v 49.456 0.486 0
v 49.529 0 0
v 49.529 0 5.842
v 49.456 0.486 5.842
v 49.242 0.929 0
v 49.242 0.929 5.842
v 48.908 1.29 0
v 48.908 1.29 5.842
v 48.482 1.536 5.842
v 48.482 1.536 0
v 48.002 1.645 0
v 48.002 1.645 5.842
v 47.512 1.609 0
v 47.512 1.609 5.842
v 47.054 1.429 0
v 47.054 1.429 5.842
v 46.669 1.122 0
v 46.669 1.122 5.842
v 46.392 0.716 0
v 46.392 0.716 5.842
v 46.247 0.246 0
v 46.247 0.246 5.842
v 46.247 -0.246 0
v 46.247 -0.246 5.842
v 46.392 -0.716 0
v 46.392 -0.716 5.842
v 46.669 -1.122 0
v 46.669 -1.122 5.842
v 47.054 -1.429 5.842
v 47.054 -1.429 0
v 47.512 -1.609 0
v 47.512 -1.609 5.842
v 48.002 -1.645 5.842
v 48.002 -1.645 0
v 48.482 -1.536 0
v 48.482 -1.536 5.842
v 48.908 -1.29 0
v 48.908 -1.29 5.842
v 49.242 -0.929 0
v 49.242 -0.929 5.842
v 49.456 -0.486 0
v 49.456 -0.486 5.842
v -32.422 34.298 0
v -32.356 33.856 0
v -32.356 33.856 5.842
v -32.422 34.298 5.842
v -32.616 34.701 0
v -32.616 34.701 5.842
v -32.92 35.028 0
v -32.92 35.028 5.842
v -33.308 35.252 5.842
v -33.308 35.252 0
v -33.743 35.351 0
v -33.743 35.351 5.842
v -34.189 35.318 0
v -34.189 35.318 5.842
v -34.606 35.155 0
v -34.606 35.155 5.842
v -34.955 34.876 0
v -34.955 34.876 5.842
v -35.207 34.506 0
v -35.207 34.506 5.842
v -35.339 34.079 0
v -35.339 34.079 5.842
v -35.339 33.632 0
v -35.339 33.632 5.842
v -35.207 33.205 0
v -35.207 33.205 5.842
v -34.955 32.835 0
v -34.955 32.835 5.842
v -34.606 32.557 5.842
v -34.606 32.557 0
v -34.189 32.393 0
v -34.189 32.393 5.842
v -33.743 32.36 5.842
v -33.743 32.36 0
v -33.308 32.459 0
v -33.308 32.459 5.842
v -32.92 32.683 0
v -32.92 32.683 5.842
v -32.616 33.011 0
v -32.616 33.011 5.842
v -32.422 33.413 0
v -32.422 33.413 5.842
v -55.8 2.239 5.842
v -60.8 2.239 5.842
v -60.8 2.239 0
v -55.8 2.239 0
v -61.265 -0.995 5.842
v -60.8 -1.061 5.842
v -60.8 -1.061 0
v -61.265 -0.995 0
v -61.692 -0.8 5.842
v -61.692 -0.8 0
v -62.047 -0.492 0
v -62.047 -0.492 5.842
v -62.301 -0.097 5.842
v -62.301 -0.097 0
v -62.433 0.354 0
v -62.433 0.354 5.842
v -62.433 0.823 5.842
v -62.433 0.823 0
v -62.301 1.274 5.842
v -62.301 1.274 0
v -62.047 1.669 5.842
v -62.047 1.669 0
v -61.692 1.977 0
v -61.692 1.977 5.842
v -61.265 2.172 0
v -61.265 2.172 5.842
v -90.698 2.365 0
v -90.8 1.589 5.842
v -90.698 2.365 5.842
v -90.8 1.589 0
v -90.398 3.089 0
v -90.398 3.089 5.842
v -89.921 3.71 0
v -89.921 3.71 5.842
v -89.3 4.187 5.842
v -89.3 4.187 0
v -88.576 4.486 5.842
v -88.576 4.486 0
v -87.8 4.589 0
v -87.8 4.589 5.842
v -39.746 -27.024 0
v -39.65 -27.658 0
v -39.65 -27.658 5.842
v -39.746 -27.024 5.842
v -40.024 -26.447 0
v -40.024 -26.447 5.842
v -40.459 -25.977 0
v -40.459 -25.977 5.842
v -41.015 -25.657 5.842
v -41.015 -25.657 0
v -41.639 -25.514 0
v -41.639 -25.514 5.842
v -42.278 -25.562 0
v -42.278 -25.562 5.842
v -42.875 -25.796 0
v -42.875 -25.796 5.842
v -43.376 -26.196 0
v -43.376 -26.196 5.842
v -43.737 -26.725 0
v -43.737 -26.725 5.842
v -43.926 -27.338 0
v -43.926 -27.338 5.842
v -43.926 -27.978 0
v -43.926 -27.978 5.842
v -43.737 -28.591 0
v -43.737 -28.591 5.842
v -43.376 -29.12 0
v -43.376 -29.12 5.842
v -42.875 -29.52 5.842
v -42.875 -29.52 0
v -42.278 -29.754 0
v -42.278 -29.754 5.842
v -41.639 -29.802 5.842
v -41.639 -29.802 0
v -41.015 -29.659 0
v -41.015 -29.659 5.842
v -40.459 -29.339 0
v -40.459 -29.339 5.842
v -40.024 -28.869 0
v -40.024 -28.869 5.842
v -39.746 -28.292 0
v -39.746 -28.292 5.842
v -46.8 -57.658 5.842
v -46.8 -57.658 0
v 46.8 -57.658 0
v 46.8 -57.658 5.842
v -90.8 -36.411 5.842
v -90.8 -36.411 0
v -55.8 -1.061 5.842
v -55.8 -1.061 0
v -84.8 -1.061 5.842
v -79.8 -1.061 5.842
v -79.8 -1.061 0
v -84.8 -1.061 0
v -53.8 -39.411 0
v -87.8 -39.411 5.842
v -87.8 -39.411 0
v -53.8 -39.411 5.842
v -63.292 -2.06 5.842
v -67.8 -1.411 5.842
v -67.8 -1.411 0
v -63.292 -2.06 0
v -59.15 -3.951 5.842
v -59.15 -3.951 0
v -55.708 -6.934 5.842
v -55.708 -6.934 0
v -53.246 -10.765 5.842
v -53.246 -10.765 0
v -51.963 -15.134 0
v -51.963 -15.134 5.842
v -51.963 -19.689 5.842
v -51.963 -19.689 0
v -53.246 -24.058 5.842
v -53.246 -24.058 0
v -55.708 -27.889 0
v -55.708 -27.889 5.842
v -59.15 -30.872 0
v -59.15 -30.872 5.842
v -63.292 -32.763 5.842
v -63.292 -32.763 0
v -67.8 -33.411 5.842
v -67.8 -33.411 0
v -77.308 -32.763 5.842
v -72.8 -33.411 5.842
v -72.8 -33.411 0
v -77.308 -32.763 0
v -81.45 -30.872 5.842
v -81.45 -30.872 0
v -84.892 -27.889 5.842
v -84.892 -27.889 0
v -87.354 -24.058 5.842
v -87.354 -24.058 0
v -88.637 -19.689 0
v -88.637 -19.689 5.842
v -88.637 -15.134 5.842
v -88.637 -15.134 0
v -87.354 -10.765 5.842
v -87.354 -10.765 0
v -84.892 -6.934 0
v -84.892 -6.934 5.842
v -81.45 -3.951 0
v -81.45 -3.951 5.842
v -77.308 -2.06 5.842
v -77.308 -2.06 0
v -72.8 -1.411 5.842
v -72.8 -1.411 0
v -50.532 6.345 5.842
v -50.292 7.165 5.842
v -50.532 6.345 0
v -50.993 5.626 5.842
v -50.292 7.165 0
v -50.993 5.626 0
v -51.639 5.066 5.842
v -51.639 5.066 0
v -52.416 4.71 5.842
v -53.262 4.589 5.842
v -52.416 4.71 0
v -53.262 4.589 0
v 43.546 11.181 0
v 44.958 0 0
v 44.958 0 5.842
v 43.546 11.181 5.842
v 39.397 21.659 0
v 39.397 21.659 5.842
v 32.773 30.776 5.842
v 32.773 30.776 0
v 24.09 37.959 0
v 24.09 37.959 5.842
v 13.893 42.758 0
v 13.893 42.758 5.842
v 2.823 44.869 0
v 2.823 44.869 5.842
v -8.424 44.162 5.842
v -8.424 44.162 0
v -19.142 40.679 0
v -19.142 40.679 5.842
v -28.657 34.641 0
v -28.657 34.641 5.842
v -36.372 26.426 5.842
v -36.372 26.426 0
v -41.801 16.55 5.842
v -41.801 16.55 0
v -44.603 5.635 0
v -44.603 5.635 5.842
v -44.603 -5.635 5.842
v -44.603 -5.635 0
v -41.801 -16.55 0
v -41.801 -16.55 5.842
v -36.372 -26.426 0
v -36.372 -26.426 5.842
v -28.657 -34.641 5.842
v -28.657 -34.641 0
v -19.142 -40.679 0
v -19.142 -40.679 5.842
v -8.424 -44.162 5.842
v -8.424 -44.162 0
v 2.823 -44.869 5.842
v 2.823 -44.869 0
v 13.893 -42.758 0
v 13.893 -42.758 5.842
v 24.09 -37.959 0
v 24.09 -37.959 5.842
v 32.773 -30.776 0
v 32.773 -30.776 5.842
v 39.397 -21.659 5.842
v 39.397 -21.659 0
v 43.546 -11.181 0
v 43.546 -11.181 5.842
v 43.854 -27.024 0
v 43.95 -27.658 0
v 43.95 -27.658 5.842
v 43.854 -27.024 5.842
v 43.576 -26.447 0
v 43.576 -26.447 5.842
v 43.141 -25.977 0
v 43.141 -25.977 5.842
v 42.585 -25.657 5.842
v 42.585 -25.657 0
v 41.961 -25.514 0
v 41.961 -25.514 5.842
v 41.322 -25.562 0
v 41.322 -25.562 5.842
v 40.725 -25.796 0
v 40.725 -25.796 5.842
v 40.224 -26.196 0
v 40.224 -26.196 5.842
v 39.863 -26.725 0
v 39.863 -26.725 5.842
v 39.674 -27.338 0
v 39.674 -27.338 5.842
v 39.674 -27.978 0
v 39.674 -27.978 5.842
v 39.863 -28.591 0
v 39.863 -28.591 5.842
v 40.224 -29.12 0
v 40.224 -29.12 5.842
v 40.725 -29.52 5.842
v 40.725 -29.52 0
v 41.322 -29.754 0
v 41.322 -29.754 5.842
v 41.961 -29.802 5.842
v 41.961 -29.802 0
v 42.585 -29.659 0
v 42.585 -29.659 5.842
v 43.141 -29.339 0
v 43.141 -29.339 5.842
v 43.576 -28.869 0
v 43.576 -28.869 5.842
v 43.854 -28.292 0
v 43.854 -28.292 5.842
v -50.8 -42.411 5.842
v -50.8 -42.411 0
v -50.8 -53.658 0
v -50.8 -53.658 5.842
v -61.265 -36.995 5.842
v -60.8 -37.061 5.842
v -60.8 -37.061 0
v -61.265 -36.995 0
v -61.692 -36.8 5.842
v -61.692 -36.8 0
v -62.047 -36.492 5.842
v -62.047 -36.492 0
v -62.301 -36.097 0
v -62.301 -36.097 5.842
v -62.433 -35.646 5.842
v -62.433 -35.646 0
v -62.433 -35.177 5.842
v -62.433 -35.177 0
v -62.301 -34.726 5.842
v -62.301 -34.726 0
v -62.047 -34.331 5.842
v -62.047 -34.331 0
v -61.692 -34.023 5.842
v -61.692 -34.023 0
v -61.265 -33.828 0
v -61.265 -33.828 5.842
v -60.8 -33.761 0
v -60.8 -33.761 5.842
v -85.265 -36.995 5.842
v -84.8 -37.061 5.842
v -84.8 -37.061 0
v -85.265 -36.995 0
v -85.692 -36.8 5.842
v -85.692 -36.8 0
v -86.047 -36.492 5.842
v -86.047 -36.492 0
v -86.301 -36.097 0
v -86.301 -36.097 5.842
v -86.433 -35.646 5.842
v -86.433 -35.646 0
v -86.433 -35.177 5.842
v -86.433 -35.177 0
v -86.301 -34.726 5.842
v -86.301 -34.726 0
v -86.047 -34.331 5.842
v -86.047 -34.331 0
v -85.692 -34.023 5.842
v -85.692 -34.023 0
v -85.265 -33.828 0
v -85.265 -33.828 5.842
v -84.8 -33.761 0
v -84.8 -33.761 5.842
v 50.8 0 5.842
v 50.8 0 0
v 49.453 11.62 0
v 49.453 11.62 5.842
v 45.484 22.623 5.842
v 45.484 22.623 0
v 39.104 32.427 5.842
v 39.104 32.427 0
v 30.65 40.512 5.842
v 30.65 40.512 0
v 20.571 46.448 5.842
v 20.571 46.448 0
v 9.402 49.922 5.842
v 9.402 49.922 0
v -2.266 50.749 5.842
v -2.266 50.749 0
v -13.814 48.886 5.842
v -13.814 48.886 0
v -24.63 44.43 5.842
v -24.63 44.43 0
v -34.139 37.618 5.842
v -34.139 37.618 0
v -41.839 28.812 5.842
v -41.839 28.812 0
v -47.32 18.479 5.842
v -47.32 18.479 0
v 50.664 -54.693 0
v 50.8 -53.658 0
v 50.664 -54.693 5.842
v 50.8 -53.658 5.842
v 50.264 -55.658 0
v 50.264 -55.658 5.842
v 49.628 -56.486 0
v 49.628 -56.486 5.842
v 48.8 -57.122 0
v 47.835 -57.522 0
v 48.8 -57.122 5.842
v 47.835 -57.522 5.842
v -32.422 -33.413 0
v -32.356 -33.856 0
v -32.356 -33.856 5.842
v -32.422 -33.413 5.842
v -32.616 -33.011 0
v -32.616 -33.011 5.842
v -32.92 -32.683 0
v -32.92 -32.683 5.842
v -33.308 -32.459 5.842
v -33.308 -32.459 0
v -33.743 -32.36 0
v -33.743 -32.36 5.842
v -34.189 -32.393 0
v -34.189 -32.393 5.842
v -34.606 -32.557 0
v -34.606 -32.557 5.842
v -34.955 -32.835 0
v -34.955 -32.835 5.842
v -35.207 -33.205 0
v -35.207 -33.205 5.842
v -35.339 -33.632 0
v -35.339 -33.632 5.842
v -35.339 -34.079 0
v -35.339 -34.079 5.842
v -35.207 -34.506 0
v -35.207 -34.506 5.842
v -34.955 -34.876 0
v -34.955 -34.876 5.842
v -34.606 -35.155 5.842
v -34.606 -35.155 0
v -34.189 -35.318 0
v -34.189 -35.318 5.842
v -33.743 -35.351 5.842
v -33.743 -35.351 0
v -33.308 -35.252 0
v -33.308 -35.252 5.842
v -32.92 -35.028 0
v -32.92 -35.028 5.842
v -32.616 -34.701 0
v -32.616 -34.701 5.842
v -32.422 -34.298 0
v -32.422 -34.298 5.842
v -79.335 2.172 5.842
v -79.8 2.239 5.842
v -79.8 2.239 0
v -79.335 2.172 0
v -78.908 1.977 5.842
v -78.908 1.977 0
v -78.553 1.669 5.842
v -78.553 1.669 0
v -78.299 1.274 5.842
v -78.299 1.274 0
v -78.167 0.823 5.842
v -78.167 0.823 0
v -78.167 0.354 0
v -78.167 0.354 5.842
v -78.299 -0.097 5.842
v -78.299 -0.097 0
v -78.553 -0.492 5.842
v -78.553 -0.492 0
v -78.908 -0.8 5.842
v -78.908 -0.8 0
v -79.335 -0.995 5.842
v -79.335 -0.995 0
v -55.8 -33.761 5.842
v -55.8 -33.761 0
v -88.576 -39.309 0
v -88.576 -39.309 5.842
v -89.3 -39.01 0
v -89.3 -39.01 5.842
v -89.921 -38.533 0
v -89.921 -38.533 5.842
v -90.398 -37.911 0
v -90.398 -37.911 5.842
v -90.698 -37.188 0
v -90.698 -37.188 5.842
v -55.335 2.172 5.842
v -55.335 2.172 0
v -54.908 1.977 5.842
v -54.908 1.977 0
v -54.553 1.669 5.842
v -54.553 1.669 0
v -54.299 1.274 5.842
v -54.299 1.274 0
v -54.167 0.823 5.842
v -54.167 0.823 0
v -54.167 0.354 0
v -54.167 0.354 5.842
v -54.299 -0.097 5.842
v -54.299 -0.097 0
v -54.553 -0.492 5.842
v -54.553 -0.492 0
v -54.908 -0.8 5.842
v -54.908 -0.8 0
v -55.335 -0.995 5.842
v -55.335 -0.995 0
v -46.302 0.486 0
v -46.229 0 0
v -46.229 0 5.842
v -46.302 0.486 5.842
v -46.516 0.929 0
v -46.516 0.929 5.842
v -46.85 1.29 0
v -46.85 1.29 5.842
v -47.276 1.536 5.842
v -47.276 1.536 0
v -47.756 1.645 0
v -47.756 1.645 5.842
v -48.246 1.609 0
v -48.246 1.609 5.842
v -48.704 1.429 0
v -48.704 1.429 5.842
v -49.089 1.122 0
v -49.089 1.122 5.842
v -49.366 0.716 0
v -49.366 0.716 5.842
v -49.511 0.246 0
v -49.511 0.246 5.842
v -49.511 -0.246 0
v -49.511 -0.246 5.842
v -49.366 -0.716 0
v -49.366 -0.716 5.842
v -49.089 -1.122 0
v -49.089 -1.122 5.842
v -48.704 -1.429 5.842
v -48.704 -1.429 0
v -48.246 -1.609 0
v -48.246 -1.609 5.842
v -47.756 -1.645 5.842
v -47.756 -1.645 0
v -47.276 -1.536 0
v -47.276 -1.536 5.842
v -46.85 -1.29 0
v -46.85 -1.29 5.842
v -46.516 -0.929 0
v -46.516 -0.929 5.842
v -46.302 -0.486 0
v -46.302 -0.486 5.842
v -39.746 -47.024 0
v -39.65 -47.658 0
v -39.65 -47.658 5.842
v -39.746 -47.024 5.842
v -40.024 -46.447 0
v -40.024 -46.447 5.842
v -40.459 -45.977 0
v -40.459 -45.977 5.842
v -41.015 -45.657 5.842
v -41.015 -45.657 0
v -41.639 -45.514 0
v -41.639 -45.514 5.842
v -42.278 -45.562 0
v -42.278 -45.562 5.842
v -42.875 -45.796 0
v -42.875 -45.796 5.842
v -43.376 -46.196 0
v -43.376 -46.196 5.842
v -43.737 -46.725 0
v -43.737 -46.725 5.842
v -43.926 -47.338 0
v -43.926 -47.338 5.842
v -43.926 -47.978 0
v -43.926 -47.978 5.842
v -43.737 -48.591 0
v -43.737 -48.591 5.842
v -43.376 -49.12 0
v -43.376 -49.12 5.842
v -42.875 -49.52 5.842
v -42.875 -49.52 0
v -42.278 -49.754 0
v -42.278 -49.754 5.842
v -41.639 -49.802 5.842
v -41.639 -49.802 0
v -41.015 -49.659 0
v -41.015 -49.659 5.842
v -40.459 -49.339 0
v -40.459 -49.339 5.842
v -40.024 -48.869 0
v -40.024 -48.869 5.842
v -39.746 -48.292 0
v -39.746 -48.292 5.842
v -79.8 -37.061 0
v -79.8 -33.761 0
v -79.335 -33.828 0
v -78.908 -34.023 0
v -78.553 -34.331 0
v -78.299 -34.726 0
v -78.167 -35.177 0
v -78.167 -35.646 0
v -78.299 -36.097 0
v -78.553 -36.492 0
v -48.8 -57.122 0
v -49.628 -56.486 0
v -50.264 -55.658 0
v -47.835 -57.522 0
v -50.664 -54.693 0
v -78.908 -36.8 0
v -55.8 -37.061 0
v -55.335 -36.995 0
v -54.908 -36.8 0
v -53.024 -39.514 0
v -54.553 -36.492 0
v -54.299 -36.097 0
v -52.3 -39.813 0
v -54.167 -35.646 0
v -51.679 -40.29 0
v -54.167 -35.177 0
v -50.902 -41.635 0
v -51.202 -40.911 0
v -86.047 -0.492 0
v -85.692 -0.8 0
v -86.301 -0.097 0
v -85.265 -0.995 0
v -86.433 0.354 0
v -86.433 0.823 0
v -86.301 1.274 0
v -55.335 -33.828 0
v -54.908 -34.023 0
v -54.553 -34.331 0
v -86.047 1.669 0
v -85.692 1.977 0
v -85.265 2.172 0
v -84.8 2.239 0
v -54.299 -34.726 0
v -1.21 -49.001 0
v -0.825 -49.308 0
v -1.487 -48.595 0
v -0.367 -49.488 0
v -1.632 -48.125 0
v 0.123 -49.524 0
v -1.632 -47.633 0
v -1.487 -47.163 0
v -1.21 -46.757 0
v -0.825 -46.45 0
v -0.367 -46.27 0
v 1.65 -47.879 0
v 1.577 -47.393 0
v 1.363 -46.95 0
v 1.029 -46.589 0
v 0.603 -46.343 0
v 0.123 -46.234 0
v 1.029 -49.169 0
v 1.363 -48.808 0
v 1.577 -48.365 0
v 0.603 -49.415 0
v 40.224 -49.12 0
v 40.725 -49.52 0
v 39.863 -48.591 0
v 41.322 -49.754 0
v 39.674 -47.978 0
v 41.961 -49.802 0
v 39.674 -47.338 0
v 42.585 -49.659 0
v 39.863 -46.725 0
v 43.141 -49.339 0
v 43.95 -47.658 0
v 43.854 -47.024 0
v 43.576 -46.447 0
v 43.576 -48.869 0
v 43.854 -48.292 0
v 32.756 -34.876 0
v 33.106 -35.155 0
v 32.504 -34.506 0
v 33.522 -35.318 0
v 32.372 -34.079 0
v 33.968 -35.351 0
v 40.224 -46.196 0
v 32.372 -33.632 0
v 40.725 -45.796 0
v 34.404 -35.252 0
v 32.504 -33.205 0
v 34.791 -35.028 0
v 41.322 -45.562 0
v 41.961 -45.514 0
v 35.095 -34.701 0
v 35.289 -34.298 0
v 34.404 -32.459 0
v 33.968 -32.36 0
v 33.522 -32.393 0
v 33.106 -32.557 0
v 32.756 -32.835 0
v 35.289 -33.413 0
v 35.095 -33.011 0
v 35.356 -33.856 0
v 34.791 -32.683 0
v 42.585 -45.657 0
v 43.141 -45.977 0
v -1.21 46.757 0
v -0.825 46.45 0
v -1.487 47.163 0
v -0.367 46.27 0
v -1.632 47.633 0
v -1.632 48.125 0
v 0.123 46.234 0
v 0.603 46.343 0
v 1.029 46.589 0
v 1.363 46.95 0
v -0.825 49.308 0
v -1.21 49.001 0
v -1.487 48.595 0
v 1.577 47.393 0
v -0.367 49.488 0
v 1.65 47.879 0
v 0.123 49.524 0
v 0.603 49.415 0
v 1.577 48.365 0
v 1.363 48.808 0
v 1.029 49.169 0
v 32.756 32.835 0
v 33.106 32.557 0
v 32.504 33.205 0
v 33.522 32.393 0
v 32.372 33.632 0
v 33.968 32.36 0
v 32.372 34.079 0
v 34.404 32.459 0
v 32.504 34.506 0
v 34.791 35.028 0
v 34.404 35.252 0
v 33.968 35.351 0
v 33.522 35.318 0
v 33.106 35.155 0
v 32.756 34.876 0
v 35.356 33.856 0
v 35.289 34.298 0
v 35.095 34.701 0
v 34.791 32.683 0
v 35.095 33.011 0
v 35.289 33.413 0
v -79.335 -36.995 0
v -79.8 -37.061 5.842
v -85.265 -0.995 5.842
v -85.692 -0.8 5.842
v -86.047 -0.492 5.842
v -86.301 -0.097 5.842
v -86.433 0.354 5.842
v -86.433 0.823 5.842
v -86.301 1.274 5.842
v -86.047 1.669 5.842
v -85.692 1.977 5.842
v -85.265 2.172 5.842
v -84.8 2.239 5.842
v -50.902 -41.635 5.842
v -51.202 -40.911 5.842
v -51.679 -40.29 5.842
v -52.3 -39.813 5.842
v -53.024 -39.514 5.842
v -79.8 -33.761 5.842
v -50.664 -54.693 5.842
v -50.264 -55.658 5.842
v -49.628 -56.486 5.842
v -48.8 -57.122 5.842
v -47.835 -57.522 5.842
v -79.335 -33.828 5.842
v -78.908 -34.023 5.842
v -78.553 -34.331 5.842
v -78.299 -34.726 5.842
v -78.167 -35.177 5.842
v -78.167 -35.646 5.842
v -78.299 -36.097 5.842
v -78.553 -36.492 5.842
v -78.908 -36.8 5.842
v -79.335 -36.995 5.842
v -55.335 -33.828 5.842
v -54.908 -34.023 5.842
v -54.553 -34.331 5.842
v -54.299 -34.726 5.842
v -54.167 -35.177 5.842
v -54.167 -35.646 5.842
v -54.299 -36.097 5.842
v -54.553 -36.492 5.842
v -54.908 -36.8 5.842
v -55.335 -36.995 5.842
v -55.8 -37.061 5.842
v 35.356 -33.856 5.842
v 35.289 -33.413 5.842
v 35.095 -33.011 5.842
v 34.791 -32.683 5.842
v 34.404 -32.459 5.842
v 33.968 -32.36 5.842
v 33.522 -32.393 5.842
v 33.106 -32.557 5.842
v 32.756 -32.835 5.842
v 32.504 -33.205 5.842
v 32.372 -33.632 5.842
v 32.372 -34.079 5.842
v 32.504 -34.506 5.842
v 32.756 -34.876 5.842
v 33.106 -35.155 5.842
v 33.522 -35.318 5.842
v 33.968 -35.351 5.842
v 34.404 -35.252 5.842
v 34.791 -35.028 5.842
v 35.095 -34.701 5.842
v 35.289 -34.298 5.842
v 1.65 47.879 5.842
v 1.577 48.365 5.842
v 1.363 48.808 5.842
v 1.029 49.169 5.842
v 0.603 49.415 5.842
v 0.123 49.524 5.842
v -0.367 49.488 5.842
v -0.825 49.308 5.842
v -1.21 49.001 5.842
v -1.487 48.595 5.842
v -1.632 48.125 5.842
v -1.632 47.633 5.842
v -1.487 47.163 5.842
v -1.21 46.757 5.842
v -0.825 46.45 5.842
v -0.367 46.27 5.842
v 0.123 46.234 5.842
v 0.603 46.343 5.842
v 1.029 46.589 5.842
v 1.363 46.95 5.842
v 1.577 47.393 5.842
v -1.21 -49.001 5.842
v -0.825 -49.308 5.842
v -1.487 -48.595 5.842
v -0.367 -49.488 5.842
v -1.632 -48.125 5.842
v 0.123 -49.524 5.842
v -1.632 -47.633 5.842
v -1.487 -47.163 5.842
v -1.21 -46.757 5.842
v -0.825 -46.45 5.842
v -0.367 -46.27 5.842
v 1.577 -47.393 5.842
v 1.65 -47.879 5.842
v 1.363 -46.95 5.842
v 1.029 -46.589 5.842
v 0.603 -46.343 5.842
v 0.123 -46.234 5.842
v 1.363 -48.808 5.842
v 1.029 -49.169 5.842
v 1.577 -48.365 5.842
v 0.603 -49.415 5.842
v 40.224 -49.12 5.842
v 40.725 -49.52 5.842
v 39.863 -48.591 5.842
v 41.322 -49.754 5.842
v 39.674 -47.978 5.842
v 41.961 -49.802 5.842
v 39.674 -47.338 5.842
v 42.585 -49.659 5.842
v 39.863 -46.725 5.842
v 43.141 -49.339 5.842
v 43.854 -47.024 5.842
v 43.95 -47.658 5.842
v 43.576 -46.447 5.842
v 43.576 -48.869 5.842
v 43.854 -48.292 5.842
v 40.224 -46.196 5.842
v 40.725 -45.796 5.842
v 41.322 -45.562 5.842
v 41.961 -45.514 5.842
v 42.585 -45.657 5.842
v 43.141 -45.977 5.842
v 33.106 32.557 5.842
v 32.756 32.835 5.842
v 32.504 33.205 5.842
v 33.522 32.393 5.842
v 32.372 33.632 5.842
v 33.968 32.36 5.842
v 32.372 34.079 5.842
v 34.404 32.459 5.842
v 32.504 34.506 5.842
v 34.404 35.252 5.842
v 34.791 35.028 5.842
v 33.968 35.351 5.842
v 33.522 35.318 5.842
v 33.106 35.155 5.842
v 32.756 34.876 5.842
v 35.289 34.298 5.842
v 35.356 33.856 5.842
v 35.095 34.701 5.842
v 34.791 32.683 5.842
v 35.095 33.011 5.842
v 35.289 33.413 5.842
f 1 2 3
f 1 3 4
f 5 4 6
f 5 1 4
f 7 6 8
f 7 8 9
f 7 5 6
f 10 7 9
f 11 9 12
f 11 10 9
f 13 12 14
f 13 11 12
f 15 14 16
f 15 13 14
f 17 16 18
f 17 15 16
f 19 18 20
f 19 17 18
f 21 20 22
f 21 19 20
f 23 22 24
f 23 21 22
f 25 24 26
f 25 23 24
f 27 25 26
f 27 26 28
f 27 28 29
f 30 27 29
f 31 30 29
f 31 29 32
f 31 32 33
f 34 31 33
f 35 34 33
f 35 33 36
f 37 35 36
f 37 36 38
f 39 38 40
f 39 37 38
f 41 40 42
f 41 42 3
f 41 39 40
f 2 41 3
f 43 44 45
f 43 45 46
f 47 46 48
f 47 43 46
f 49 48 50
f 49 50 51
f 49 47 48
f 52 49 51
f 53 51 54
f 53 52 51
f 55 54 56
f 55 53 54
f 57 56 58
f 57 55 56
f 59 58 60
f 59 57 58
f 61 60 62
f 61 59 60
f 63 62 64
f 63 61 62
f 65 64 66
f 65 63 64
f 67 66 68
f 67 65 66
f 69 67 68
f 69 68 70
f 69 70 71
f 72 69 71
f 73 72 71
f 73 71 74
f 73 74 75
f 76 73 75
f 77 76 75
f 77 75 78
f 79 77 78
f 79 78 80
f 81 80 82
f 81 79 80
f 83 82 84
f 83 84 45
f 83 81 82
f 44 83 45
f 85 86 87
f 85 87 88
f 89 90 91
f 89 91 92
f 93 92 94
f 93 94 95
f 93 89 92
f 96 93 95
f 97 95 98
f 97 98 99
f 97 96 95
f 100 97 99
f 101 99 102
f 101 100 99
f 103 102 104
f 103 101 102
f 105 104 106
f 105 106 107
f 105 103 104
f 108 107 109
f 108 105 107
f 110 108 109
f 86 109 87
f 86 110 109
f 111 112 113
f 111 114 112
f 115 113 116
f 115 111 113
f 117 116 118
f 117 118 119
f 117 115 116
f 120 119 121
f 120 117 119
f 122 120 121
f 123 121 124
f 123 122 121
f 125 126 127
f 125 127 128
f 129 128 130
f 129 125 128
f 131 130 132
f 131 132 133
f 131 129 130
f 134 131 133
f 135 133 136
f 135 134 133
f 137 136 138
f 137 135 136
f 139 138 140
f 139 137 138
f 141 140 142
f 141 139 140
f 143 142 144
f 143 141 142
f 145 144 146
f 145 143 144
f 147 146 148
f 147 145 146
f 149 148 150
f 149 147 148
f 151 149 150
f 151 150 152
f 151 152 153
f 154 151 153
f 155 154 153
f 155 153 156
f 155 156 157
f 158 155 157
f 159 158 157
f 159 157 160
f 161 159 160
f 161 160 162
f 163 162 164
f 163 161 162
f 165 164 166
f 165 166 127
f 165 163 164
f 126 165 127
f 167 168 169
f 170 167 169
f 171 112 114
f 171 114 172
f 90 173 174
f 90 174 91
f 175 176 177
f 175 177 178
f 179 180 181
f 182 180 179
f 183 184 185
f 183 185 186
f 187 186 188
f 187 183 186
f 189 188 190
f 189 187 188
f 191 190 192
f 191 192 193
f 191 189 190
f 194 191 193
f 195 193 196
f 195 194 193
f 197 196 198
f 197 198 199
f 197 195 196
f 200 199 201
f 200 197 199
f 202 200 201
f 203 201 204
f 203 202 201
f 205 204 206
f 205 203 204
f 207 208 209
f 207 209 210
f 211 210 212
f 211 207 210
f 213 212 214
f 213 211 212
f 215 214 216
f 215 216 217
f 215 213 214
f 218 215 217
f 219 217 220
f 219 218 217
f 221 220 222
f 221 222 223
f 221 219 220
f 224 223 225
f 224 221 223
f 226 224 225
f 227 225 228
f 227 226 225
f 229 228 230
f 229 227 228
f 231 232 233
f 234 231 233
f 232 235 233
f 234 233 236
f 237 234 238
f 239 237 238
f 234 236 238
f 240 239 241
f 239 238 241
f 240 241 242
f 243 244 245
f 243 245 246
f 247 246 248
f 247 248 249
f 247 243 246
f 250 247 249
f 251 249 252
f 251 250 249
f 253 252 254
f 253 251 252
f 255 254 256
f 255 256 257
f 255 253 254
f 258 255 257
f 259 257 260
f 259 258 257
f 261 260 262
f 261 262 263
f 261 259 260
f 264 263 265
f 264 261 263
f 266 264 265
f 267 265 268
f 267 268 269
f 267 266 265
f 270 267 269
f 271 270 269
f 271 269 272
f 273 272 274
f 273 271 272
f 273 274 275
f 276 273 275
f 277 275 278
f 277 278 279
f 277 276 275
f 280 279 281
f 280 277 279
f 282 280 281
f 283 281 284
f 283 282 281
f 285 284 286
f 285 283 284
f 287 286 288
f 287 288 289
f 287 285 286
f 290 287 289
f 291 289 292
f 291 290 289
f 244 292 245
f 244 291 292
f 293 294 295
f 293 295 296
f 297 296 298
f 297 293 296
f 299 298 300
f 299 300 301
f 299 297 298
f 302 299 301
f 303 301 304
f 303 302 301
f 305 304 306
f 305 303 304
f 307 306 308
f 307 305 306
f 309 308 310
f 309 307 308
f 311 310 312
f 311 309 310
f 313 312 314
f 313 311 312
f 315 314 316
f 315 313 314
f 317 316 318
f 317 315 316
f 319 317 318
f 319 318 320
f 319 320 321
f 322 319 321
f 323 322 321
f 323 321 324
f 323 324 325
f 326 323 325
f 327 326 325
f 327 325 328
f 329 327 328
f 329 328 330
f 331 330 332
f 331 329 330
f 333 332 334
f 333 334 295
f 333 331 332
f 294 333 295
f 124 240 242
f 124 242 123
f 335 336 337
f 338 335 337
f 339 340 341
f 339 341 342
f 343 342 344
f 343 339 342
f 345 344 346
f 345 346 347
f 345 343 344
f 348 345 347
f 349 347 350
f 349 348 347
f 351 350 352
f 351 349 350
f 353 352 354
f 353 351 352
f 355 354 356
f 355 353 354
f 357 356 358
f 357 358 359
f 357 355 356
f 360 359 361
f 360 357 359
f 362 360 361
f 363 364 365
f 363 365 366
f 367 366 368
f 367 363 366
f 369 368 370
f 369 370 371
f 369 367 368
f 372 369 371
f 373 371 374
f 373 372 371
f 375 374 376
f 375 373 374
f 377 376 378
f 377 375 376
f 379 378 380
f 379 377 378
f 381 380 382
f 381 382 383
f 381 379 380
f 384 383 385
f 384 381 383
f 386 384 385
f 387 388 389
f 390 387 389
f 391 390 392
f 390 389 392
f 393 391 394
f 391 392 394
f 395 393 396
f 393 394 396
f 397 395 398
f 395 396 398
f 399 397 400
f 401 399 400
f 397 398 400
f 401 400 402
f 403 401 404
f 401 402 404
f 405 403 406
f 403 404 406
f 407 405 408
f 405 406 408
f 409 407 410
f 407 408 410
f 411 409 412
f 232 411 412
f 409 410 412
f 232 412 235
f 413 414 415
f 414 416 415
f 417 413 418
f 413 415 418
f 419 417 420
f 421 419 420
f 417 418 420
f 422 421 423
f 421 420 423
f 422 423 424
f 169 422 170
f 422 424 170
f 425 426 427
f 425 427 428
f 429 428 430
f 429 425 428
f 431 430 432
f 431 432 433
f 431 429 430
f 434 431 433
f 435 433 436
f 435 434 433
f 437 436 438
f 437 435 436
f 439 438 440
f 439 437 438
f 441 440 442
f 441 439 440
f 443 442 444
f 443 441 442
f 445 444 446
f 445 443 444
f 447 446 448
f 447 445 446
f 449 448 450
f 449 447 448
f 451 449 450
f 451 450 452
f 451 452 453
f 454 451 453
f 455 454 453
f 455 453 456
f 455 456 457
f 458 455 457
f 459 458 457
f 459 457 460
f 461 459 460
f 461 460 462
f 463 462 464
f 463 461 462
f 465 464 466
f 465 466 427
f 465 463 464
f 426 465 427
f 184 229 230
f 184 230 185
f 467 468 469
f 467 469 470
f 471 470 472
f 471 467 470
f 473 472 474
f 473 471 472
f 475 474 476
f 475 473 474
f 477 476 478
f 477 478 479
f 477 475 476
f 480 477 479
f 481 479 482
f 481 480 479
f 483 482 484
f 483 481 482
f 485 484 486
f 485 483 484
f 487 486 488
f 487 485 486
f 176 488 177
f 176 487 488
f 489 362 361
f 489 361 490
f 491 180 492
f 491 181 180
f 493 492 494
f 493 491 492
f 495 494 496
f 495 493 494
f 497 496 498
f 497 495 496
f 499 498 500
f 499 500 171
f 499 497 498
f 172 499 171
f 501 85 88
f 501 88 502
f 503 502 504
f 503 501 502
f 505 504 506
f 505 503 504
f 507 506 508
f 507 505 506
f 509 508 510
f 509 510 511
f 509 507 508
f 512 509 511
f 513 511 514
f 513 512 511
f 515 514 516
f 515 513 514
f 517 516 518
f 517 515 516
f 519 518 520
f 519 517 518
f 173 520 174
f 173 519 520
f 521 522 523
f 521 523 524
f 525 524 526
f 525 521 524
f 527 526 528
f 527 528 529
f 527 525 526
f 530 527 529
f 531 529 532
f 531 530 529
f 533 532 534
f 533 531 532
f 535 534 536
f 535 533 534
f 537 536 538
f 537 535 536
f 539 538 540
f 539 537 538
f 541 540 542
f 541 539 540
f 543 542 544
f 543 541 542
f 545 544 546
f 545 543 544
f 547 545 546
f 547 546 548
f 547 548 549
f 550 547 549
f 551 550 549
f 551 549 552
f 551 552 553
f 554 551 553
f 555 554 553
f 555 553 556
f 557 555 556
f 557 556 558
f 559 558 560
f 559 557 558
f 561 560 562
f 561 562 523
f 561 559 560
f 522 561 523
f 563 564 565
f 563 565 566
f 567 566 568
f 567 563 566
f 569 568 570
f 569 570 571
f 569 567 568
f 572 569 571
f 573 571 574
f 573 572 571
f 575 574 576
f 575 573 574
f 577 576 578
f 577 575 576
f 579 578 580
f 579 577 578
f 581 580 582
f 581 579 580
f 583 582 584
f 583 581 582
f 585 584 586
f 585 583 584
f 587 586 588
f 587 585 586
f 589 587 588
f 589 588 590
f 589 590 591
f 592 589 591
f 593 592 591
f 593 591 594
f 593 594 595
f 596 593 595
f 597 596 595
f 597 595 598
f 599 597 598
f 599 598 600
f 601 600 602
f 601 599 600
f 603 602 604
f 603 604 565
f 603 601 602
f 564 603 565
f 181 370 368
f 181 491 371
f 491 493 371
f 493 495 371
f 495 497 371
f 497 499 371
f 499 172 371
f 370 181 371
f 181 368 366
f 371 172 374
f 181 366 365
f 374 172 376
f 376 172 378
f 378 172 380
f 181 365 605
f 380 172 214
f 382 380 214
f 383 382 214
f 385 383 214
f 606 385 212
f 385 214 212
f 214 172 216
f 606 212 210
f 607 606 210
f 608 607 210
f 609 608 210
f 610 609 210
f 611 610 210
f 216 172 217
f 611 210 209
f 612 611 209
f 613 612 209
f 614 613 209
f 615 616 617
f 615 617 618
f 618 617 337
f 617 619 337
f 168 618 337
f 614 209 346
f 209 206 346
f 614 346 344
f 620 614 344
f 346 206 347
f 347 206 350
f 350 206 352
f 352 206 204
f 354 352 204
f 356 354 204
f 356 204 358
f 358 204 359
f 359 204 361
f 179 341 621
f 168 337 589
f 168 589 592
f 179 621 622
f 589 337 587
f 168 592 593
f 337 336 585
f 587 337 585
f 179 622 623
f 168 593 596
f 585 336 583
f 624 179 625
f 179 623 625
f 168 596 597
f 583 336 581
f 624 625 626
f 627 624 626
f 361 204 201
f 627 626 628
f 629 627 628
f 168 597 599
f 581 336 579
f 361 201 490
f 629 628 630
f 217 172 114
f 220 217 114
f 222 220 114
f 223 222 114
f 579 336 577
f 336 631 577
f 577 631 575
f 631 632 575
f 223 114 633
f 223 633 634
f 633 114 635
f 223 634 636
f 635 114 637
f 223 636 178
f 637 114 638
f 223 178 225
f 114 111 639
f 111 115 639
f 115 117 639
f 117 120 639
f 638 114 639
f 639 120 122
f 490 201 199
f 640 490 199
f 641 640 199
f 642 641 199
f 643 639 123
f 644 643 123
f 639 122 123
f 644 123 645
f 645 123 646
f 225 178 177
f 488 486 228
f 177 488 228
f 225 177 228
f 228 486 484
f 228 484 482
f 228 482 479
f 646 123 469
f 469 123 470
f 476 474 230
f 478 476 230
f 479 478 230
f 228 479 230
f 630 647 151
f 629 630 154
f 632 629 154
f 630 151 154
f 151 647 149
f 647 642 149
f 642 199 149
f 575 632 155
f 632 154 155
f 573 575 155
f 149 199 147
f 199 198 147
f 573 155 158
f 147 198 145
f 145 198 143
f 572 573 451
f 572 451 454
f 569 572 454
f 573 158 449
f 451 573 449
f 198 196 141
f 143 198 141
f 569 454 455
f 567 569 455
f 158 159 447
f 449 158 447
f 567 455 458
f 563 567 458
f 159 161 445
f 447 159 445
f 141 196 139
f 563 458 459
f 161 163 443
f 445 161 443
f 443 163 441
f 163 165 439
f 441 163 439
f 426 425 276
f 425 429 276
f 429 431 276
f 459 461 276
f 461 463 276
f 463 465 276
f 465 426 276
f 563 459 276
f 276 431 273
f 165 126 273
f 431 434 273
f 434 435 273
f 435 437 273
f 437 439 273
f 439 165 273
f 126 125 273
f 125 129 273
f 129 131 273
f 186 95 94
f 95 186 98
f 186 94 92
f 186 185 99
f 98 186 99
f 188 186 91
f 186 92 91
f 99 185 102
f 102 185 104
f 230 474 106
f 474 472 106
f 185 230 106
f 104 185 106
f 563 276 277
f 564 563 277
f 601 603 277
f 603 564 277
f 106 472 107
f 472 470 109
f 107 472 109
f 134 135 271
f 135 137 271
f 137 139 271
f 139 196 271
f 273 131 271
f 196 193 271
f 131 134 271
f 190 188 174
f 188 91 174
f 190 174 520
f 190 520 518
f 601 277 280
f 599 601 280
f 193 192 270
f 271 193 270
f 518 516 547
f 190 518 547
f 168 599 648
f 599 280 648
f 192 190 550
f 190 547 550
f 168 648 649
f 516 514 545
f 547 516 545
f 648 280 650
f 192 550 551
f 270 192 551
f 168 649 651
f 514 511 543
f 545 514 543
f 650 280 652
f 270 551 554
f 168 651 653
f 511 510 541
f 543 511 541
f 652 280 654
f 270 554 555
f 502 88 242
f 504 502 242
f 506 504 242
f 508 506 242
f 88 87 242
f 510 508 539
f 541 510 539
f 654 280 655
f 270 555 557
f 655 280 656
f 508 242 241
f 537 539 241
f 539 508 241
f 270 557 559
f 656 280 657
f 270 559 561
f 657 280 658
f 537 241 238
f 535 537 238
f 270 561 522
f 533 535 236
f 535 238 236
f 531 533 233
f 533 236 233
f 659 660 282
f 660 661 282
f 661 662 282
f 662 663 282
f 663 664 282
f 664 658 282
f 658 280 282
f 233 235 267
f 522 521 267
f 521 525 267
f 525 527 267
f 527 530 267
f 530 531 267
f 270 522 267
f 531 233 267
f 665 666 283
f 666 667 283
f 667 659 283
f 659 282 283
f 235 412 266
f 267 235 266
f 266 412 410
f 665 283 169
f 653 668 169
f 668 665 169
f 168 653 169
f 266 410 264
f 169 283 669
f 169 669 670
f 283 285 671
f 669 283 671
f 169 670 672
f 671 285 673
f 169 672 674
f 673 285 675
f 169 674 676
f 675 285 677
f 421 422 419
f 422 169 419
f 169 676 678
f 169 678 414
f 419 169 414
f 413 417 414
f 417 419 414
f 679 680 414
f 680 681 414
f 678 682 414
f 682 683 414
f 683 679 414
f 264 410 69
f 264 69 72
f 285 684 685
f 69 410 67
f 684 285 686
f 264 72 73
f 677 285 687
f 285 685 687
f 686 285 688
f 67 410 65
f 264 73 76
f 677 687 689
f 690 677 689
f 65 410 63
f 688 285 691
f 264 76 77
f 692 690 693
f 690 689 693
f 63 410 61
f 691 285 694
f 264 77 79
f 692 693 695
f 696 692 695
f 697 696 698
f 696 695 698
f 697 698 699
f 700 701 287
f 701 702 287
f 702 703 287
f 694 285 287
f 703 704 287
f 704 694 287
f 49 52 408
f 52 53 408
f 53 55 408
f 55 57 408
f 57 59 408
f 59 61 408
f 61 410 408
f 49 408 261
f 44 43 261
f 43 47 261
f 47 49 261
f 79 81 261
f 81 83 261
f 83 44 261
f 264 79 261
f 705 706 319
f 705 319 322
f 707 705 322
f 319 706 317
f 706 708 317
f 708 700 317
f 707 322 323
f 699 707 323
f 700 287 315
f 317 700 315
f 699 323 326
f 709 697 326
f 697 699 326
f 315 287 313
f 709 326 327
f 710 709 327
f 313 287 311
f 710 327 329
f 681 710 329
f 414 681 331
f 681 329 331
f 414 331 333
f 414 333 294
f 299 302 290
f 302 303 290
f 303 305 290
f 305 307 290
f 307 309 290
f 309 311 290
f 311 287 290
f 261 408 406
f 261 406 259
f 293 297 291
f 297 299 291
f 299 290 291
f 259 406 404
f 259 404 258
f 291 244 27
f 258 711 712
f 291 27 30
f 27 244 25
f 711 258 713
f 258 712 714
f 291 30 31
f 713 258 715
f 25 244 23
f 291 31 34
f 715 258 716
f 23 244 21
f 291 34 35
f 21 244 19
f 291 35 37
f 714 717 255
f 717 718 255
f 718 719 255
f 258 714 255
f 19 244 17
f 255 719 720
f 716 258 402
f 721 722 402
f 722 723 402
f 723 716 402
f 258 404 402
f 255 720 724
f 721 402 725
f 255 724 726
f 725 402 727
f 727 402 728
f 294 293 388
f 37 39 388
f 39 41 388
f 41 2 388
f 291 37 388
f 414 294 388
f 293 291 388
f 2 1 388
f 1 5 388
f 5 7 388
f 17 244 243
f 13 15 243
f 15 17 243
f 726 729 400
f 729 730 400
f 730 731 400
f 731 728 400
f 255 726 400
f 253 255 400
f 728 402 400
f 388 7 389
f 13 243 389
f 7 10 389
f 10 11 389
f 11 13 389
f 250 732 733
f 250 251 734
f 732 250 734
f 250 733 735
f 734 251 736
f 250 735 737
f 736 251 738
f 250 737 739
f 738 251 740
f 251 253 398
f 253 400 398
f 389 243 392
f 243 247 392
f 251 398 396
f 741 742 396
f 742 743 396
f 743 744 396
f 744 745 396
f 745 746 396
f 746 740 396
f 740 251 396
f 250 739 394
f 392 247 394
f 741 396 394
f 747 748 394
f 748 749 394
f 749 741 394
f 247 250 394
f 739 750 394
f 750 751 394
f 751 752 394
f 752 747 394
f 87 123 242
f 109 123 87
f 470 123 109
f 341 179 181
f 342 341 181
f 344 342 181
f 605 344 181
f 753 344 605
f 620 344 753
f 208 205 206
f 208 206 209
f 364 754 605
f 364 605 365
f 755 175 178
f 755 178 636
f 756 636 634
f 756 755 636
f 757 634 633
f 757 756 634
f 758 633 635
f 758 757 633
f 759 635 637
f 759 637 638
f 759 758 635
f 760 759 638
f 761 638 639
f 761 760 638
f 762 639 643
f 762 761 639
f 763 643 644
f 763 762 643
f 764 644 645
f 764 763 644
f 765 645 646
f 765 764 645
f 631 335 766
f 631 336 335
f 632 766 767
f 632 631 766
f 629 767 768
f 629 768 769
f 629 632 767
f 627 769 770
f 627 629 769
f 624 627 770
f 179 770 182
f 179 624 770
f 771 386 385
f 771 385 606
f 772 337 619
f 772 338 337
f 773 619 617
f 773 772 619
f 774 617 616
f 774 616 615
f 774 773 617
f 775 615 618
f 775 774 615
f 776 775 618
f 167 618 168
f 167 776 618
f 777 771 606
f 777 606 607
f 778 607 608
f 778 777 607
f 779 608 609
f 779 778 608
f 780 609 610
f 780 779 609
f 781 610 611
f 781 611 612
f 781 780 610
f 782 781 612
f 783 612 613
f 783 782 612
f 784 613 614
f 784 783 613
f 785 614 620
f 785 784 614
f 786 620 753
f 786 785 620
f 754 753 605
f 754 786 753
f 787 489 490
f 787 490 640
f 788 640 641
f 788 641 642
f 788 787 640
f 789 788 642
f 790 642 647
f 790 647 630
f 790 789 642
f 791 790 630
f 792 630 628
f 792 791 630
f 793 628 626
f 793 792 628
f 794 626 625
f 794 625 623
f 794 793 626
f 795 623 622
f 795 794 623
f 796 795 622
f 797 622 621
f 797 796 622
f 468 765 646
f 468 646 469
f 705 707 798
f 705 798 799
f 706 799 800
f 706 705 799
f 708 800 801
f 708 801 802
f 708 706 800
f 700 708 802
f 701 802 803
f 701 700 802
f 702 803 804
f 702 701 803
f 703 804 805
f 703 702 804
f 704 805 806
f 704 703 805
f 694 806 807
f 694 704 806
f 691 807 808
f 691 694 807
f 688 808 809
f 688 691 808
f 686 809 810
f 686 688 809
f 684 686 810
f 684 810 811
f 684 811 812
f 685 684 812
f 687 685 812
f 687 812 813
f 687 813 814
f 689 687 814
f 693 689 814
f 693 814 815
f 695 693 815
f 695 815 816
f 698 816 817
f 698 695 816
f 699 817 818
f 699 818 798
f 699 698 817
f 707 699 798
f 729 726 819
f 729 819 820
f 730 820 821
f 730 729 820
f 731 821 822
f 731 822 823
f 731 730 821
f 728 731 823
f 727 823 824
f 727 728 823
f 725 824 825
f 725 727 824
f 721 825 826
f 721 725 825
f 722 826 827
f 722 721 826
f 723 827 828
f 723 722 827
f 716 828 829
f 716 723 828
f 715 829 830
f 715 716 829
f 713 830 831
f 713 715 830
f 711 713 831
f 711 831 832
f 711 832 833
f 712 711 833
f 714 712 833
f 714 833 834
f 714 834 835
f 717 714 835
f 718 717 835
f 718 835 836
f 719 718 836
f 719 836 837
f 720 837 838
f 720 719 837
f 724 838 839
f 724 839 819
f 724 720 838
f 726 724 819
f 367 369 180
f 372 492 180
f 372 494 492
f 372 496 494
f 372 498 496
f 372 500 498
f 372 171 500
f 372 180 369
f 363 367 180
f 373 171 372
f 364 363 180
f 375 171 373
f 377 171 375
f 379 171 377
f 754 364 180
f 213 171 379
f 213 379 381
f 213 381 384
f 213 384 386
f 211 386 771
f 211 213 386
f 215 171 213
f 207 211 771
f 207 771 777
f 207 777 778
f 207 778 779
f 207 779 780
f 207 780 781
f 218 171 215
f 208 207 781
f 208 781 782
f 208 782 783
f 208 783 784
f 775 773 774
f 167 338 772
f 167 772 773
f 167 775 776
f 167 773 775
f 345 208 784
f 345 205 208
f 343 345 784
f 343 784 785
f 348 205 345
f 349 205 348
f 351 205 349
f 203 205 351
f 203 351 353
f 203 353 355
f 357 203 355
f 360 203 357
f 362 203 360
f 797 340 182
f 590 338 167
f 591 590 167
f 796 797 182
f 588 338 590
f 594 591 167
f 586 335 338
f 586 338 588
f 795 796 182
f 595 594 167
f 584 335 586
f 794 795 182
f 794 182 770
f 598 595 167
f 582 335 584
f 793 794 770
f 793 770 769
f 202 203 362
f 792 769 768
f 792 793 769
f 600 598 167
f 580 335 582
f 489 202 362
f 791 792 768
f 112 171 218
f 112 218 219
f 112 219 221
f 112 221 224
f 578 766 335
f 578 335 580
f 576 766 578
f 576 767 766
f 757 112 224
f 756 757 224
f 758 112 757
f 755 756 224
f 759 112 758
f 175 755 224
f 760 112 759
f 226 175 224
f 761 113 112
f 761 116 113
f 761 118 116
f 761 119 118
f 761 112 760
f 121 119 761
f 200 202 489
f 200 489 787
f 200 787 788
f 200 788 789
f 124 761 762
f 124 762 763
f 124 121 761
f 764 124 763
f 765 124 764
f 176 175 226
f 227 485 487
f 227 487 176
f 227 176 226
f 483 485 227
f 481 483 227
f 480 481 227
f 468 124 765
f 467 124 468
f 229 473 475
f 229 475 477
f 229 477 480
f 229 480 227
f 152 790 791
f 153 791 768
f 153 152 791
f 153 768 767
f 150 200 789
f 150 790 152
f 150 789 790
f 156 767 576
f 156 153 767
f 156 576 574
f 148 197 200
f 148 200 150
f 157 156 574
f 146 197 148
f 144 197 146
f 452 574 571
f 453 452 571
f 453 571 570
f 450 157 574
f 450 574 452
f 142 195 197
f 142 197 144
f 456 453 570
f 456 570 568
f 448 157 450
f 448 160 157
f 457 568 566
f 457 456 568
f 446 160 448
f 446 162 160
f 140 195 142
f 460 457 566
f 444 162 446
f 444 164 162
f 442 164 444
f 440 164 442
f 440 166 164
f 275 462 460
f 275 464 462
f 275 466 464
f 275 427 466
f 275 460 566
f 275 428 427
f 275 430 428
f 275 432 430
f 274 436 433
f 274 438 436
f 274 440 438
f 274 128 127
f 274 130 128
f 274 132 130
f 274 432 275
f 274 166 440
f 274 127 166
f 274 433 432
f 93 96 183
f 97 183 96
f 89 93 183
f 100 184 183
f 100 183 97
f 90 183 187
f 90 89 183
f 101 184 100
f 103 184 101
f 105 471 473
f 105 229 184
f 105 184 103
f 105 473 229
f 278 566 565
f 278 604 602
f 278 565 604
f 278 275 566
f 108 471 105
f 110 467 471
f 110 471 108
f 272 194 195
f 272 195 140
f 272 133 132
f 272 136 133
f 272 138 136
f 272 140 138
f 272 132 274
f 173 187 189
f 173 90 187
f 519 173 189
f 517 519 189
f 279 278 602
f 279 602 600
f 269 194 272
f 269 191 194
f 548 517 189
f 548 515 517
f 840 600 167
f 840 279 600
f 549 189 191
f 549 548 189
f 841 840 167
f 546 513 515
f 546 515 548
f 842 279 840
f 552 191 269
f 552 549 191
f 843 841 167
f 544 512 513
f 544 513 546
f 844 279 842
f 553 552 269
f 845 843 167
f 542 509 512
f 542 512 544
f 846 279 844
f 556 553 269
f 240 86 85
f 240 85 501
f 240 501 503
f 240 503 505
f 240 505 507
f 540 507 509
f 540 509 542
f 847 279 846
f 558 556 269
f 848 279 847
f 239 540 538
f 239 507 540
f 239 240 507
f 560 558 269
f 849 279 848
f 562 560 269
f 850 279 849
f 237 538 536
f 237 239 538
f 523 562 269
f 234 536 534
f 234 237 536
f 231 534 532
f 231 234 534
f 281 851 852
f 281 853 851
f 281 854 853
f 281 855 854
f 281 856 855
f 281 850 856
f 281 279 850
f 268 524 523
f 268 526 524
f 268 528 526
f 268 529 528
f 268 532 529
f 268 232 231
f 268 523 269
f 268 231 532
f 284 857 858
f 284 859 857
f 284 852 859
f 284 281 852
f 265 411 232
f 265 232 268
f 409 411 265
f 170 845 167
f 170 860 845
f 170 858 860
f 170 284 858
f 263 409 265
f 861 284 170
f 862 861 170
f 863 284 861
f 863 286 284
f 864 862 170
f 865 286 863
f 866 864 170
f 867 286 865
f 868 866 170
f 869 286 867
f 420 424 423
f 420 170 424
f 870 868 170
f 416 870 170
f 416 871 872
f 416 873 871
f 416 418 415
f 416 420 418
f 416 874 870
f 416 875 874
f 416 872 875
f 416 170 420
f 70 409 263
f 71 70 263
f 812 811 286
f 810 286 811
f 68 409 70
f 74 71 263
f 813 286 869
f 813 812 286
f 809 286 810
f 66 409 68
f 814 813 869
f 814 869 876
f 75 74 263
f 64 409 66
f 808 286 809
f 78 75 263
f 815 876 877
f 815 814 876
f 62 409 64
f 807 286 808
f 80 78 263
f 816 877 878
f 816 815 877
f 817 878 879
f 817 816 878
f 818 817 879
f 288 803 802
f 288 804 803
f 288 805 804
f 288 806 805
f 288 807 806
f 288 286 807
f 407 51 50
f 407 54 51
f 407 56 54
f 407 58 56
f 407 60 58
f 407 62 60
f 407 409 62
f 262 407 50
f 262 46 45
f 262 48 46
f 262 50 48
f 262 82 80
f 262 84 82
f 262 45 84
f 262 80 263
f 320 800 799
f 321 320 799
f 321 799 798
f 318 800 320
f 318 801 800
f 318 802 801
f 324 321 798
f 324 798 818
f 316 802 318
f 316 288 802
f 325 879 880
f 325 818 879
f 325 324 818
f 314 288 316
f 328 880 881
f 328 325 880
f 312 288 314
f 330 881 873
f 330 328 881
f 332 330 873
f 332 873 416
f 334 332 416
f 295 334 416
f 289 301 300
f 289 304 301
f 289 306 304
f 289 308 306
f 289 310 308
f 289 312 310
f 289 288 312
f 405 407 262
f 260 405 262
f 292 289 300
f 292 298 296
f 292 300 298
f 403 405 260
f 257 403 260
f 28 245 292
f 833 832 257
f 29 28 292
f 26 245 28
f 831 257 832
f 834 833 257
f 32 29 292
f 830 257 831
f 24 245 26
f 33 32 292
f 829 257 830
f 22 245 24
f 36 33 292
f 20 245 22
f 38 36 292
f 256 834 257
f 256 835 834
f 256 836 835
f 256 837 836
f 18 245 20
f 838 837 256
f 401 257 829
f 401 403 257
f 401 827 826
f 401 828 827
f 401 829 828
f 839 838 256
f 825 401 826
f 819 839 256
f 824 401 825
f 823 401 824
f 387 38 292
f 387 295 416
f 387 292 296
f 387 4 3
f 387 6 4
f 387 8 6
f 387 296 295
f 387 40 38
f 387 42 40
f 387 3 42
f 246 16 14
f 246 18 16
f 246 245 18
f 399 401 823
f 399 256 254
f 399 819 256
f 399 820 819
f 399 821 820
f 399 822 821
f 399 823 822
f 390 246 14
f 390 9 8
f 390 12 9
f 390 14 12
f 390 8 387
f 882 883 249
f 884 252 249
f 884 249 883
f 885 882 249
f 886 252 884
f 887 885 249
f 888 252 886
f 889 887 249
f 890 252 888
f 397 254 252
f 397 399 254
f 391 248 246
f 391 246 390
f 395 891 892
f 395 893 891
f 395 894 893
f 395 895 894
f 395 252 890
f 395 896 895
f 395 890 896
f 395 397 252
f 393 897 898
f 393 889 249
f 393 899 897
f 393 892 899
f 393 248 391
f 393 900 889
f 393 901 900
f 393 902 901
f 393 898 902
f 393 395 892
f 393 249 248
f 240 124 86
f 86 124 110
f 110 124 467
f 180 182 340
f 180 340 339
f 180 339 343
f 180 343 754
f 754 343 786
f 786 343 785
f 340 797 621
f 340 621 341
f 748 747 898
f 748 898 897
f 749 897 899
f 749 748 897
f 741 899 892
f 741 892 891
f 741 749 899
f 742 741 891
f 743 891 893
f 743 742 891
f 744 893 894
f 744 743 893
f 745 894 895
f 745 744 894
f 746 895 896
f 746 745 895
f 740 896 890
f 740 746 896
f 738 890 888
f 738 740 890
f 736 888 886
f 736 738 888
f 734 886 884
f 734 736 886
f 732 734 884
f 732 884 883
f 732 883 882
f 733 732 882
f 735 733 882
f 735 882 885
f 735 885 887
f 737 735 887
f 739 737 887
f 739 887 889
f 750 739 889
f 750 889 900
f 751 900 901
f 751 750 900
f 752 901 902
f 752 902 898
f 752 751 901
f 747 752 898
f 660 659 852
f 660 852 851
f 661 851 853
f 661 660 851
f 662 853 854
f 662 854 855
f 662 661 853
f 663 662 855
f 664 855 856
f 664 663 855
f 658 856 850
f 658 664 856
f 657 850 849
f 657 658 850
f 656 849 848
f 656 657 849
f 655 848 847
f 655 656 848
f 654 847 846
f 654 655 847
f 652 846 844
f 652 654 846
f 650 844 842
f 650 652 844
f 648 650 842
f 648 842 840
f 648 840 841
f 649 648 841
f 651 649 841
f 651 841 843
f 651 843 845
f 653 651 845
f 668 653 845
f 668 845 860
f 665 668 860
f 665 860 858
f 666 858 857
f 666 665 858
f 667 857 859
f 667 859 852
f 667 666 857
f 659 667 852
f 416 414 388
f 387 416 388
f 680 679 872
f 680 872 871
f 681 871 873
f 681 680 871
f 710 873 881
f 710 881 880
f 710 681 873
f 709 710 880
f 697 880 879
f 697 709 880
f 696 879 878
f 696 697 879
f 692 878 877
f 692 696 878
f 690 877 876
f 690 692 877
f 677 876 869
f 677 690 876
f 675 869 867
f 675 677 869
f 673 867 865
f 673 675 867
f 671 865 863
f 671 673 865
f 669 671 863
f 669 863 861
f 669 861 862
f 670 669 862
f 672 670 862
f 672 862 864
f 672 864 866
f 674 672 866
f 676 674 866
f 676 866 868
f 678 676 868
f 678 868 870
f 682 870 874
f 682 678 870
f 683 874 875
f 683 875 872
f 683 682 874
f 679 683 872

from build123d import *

# Parameters (mm, degrees)
SKETCH1_R           = 2.15
SKETCH1_R_2         = 1.5
SKETCH1_R_3         = 1.65
SKETCH1_R_4         = 44.958
BOSS_EXTRUDE1_DEPTH = 5.842
FILLET1_R           = 4
BOSS_EXTRUDE2_DEPTH = 5.842
FILLET2_R           = 3


with BuildPart() as part:
    # Sketch1 → Boss-Extrude1 (new body)
    # profile 1 of 2: a face of its own
    with BuildSketch(Plane.XY):
        with BuildLine():
            ThreePointArc((50.8, 0), (0, 50.8), (-50.8, 0))
            Line((-50.8, 0), (-50.8, -57.658))
            Line((-50.8, -57.658), (0, -57.658))
            Line((0, -57.658), (50.8, -57.658))
            Line((50.8, -57.658), (50.8, 0))
        make_face()
        with Locations((-41.8, -47.658)):
            Circle(SKETCH1_R, mode=Mode.SUBTRACT)
        with Locations((-33.855565576, -33.855565576)):
            Circle(SKETCH1_R_2, mode=Mode.SUBTRACT)
        with Locations((-41.8, -27.658)):
            Circle(SKETCH1_R, mode=Mode.SUBTRACT)
        with Locations((0, -47.879)):
            Circle(SKETCH1_R_3, mode=Mode.SUBTRACT)
        with Locations((41.8, -47.658)):
            Circle(SKETCH1_R, mode=Mode.SUBTRACT)
        with Locations((33.855565576, -33.855565576)):
            Circle(SKETCH1_R_2, mode=Mode.SUBTRACT)
        with Locations((41.8, -27.658)):
            Circle(SKETCH1_R, mode=Mode.SUBTRACT)
        with Locations((-47.879, 0)):
            Circle(SKETCH1_R_3, mode=Mode.SUBTRACT)
        Circle(SKETCH1_R_4, mode=Mode.SUBTRACT)
        with Locations((-33.855565576, 33.855565576)):
            Circle(SKETCH1_R_2, mode=Mode.SUBTRACT)
        with Locations((0, 47.879)):
            Circle(SKETCH1_R_3, mode=Mode.SUBTRACT)
        with Locations((47.879, 0)):
            Circle(SKETCH1_R_3, mode=Mode.SUBTRACT)
        with Locations((33.855565576, 33.855565576)):
            Circle(SKETCH1_R_2, mode=Mode.SUBTRACT)
    # profile 2 of 2: a face of its own
    with BuildSketch(Plane.XY):
        with BuildLine():
            ThreePointArc((50.8, 0), (0, 50.8), (-50.8, 0))
            Line((-50.8, 0), (-50.8, -57.658))
            Line((-50.8, -57.658), (0, -57.658))
            Line((0, -57.658), (50.8, -57.658))
            Line((50.8, -57.658), (50.8, 0))
        make_face()
        with Locations((-41.8, -47.658)):
            Circle(SKETCH1_R, mode=Mode.SUBTRACT)
        with Locations((-33.855565576, -33.855565576)):
            Circle(SKETCH1_R_2, mode=Mode.SUBTRACT)
        with Locations((-41.8, -27.658)):
            Circle(SKETCH1_R, mode=Mode.SUBTRACT)
        with Locations((0, -47.879)):
            Circle(SKETCH1_R_3, mode=Mode.SUBTRACT)
        with Locations((41.8, -47.658)):
            Circle(SKETCH1_R, mode=Mode.SUBTRACT)
        with Locations((33.855565576, -33.855565576)):
            Circle(SKETCH1_R_2, mode=Mode.SUBTRACT)
        with Locations((41.8, -27.658)):
            Circle(SKETCH1_R, mode=Mode.SUBTRACT)
        with Locations((-47.879, 0)):
            Circle(SKETCH1_R_3, mode=Mode.SUBTRACT)
        Circle(SKETCH1_R_4, mode=Mode.SUBTRACT)
        with Locations((-33.855565576, 33.855565576)):
            Circle(SKETCH1_R_2, mode=Mode.SUBTRACT)
        with Locations((0, 47.879)):
            Circle(SKETCH1_R_3, mode=Mode.SUBTRACT)
        with Locations((47.879, 0)):
            Circle(SKETCH1_R_3, mode=Mode.SUBTRACT)
        with Locations((33.855565576, 33.855565576)):
            Circle(SKETCH1_R_2, mode=Mode.SUBTRACT)
    extrude(amount=BOSS_EXTRUDE1_DEPTH)

    # Fillet1
    fillet1_edges = [part.edges().sort_by_distance(p)[0] for p in [
        (50.8, -57.658, 2.921),
        (-50.8, -57.658, 2.921),
    ]]
    fillet(fillet1_edges, radius=FILLET1_R)

    # Sketch2 → Boss-Extrude2 (add, through all)
    with BuildSketch(Plane.XY.offset(5.842)):
        Polygon((-50.8, -39.411490459), (-50.592347052, 4.588509541), (-90.8, 4.588509541), (-90.8, -39.411490459), align=None)
        with BuildLine():
            ThreePointArc((-79.8, -33.761490459), (-78.15, -35.411490459), (-79.8, -37.061490459))
            Line((-79.8, -37.061490459), (-84.8, -37.061490459))
            ThreePointArc((-84.8, -37.061490459), (-86.45, -35.411490459), (-84.8, -33.761490459))
            Line((-84.8, -33.761490459), (-79.8, -33.761490459))
        make_face(mode=Mode.SUBTRACT)
        with BuildLine():
            ThreePointArc((-55.8, -33.761490459), (-54.15, -35.411490459), (-55.8, -37.061490459))
            Line((-55.8, -37.061490459), (-60.8, -37.061490459))
            ThreePointArc((-60.8, -37.061490459), (-62.45, -35.411490459), (-60.8, -33.761490459))
            Line((-60.8, -33.761490459), (-55.8, -33.761490459))
        make_face(mode=Mode.SUBTRACT)
        with BuildLine():
            ThreePointArc((-79.8, 2.238509541), (-78.15, 0.588509541), (-79.8, -1.061490459))
            Line((-79.8, -1.061490459), (-84.8, -1.061490459))
            ThreePointArc((-84.8, -1.061490459), (-86.45, 0.588509541), (-84.8, 2.238509541))
            Line((-84.8, 2.238509541), (-79.8, 2.238509541))
        make_face(mode=Mode.SUBTRACT)
        with BuildLine():
            ThreePointArc((-67.8, -1.411490459), (-51.8, -17.411490459), (-67.8, -33.411490459))
            Line((-67.8, -33.411490459), (-72.8, -33.411490459))
            ThreePointArc((-72.8, -33.411490459), (-88.8, -17.411490459), (-72.8, -1.411490459))
            Line((-72.8, -1.411490459), (-67.8, -1.411490459))
        make_face(mode=Mode.SUBTRACT)
        with BuildLine():
            ThreePointArc((-55.8, 2.238509541), (-54.15, 0.588509541), (-55.8, -1.061490459))
            Line((-55.8, -1.061490459), (-60.8, -1.061490459))
            ThreePointArc((-60.8, -1.061490459), (-62.45, 0.588509541), (-60.8, 2.238509541))
            Line((-60.8, 2.238509541), (-55.8, 2.238509541))
        make_face(mode=Mode.SUBTRACT)
    extrude(amount=-BOSS_EXTRUDE2_DEPTH)

    # Fillet2
    fillet2_edges = [part.edges().sort_by_distance(p)[0] for p in [
        (-50.592347052, 4.588509541, 2.921),
        (-50.8, -39.411490459, 2.921),
        (-90.8, -39.411490459, 2.921),
        (-90.8, 4.588509541, 2.921),
    ]]
    fillet(fillet2_edges, radius=FILLET2_R)


solid = part.part
